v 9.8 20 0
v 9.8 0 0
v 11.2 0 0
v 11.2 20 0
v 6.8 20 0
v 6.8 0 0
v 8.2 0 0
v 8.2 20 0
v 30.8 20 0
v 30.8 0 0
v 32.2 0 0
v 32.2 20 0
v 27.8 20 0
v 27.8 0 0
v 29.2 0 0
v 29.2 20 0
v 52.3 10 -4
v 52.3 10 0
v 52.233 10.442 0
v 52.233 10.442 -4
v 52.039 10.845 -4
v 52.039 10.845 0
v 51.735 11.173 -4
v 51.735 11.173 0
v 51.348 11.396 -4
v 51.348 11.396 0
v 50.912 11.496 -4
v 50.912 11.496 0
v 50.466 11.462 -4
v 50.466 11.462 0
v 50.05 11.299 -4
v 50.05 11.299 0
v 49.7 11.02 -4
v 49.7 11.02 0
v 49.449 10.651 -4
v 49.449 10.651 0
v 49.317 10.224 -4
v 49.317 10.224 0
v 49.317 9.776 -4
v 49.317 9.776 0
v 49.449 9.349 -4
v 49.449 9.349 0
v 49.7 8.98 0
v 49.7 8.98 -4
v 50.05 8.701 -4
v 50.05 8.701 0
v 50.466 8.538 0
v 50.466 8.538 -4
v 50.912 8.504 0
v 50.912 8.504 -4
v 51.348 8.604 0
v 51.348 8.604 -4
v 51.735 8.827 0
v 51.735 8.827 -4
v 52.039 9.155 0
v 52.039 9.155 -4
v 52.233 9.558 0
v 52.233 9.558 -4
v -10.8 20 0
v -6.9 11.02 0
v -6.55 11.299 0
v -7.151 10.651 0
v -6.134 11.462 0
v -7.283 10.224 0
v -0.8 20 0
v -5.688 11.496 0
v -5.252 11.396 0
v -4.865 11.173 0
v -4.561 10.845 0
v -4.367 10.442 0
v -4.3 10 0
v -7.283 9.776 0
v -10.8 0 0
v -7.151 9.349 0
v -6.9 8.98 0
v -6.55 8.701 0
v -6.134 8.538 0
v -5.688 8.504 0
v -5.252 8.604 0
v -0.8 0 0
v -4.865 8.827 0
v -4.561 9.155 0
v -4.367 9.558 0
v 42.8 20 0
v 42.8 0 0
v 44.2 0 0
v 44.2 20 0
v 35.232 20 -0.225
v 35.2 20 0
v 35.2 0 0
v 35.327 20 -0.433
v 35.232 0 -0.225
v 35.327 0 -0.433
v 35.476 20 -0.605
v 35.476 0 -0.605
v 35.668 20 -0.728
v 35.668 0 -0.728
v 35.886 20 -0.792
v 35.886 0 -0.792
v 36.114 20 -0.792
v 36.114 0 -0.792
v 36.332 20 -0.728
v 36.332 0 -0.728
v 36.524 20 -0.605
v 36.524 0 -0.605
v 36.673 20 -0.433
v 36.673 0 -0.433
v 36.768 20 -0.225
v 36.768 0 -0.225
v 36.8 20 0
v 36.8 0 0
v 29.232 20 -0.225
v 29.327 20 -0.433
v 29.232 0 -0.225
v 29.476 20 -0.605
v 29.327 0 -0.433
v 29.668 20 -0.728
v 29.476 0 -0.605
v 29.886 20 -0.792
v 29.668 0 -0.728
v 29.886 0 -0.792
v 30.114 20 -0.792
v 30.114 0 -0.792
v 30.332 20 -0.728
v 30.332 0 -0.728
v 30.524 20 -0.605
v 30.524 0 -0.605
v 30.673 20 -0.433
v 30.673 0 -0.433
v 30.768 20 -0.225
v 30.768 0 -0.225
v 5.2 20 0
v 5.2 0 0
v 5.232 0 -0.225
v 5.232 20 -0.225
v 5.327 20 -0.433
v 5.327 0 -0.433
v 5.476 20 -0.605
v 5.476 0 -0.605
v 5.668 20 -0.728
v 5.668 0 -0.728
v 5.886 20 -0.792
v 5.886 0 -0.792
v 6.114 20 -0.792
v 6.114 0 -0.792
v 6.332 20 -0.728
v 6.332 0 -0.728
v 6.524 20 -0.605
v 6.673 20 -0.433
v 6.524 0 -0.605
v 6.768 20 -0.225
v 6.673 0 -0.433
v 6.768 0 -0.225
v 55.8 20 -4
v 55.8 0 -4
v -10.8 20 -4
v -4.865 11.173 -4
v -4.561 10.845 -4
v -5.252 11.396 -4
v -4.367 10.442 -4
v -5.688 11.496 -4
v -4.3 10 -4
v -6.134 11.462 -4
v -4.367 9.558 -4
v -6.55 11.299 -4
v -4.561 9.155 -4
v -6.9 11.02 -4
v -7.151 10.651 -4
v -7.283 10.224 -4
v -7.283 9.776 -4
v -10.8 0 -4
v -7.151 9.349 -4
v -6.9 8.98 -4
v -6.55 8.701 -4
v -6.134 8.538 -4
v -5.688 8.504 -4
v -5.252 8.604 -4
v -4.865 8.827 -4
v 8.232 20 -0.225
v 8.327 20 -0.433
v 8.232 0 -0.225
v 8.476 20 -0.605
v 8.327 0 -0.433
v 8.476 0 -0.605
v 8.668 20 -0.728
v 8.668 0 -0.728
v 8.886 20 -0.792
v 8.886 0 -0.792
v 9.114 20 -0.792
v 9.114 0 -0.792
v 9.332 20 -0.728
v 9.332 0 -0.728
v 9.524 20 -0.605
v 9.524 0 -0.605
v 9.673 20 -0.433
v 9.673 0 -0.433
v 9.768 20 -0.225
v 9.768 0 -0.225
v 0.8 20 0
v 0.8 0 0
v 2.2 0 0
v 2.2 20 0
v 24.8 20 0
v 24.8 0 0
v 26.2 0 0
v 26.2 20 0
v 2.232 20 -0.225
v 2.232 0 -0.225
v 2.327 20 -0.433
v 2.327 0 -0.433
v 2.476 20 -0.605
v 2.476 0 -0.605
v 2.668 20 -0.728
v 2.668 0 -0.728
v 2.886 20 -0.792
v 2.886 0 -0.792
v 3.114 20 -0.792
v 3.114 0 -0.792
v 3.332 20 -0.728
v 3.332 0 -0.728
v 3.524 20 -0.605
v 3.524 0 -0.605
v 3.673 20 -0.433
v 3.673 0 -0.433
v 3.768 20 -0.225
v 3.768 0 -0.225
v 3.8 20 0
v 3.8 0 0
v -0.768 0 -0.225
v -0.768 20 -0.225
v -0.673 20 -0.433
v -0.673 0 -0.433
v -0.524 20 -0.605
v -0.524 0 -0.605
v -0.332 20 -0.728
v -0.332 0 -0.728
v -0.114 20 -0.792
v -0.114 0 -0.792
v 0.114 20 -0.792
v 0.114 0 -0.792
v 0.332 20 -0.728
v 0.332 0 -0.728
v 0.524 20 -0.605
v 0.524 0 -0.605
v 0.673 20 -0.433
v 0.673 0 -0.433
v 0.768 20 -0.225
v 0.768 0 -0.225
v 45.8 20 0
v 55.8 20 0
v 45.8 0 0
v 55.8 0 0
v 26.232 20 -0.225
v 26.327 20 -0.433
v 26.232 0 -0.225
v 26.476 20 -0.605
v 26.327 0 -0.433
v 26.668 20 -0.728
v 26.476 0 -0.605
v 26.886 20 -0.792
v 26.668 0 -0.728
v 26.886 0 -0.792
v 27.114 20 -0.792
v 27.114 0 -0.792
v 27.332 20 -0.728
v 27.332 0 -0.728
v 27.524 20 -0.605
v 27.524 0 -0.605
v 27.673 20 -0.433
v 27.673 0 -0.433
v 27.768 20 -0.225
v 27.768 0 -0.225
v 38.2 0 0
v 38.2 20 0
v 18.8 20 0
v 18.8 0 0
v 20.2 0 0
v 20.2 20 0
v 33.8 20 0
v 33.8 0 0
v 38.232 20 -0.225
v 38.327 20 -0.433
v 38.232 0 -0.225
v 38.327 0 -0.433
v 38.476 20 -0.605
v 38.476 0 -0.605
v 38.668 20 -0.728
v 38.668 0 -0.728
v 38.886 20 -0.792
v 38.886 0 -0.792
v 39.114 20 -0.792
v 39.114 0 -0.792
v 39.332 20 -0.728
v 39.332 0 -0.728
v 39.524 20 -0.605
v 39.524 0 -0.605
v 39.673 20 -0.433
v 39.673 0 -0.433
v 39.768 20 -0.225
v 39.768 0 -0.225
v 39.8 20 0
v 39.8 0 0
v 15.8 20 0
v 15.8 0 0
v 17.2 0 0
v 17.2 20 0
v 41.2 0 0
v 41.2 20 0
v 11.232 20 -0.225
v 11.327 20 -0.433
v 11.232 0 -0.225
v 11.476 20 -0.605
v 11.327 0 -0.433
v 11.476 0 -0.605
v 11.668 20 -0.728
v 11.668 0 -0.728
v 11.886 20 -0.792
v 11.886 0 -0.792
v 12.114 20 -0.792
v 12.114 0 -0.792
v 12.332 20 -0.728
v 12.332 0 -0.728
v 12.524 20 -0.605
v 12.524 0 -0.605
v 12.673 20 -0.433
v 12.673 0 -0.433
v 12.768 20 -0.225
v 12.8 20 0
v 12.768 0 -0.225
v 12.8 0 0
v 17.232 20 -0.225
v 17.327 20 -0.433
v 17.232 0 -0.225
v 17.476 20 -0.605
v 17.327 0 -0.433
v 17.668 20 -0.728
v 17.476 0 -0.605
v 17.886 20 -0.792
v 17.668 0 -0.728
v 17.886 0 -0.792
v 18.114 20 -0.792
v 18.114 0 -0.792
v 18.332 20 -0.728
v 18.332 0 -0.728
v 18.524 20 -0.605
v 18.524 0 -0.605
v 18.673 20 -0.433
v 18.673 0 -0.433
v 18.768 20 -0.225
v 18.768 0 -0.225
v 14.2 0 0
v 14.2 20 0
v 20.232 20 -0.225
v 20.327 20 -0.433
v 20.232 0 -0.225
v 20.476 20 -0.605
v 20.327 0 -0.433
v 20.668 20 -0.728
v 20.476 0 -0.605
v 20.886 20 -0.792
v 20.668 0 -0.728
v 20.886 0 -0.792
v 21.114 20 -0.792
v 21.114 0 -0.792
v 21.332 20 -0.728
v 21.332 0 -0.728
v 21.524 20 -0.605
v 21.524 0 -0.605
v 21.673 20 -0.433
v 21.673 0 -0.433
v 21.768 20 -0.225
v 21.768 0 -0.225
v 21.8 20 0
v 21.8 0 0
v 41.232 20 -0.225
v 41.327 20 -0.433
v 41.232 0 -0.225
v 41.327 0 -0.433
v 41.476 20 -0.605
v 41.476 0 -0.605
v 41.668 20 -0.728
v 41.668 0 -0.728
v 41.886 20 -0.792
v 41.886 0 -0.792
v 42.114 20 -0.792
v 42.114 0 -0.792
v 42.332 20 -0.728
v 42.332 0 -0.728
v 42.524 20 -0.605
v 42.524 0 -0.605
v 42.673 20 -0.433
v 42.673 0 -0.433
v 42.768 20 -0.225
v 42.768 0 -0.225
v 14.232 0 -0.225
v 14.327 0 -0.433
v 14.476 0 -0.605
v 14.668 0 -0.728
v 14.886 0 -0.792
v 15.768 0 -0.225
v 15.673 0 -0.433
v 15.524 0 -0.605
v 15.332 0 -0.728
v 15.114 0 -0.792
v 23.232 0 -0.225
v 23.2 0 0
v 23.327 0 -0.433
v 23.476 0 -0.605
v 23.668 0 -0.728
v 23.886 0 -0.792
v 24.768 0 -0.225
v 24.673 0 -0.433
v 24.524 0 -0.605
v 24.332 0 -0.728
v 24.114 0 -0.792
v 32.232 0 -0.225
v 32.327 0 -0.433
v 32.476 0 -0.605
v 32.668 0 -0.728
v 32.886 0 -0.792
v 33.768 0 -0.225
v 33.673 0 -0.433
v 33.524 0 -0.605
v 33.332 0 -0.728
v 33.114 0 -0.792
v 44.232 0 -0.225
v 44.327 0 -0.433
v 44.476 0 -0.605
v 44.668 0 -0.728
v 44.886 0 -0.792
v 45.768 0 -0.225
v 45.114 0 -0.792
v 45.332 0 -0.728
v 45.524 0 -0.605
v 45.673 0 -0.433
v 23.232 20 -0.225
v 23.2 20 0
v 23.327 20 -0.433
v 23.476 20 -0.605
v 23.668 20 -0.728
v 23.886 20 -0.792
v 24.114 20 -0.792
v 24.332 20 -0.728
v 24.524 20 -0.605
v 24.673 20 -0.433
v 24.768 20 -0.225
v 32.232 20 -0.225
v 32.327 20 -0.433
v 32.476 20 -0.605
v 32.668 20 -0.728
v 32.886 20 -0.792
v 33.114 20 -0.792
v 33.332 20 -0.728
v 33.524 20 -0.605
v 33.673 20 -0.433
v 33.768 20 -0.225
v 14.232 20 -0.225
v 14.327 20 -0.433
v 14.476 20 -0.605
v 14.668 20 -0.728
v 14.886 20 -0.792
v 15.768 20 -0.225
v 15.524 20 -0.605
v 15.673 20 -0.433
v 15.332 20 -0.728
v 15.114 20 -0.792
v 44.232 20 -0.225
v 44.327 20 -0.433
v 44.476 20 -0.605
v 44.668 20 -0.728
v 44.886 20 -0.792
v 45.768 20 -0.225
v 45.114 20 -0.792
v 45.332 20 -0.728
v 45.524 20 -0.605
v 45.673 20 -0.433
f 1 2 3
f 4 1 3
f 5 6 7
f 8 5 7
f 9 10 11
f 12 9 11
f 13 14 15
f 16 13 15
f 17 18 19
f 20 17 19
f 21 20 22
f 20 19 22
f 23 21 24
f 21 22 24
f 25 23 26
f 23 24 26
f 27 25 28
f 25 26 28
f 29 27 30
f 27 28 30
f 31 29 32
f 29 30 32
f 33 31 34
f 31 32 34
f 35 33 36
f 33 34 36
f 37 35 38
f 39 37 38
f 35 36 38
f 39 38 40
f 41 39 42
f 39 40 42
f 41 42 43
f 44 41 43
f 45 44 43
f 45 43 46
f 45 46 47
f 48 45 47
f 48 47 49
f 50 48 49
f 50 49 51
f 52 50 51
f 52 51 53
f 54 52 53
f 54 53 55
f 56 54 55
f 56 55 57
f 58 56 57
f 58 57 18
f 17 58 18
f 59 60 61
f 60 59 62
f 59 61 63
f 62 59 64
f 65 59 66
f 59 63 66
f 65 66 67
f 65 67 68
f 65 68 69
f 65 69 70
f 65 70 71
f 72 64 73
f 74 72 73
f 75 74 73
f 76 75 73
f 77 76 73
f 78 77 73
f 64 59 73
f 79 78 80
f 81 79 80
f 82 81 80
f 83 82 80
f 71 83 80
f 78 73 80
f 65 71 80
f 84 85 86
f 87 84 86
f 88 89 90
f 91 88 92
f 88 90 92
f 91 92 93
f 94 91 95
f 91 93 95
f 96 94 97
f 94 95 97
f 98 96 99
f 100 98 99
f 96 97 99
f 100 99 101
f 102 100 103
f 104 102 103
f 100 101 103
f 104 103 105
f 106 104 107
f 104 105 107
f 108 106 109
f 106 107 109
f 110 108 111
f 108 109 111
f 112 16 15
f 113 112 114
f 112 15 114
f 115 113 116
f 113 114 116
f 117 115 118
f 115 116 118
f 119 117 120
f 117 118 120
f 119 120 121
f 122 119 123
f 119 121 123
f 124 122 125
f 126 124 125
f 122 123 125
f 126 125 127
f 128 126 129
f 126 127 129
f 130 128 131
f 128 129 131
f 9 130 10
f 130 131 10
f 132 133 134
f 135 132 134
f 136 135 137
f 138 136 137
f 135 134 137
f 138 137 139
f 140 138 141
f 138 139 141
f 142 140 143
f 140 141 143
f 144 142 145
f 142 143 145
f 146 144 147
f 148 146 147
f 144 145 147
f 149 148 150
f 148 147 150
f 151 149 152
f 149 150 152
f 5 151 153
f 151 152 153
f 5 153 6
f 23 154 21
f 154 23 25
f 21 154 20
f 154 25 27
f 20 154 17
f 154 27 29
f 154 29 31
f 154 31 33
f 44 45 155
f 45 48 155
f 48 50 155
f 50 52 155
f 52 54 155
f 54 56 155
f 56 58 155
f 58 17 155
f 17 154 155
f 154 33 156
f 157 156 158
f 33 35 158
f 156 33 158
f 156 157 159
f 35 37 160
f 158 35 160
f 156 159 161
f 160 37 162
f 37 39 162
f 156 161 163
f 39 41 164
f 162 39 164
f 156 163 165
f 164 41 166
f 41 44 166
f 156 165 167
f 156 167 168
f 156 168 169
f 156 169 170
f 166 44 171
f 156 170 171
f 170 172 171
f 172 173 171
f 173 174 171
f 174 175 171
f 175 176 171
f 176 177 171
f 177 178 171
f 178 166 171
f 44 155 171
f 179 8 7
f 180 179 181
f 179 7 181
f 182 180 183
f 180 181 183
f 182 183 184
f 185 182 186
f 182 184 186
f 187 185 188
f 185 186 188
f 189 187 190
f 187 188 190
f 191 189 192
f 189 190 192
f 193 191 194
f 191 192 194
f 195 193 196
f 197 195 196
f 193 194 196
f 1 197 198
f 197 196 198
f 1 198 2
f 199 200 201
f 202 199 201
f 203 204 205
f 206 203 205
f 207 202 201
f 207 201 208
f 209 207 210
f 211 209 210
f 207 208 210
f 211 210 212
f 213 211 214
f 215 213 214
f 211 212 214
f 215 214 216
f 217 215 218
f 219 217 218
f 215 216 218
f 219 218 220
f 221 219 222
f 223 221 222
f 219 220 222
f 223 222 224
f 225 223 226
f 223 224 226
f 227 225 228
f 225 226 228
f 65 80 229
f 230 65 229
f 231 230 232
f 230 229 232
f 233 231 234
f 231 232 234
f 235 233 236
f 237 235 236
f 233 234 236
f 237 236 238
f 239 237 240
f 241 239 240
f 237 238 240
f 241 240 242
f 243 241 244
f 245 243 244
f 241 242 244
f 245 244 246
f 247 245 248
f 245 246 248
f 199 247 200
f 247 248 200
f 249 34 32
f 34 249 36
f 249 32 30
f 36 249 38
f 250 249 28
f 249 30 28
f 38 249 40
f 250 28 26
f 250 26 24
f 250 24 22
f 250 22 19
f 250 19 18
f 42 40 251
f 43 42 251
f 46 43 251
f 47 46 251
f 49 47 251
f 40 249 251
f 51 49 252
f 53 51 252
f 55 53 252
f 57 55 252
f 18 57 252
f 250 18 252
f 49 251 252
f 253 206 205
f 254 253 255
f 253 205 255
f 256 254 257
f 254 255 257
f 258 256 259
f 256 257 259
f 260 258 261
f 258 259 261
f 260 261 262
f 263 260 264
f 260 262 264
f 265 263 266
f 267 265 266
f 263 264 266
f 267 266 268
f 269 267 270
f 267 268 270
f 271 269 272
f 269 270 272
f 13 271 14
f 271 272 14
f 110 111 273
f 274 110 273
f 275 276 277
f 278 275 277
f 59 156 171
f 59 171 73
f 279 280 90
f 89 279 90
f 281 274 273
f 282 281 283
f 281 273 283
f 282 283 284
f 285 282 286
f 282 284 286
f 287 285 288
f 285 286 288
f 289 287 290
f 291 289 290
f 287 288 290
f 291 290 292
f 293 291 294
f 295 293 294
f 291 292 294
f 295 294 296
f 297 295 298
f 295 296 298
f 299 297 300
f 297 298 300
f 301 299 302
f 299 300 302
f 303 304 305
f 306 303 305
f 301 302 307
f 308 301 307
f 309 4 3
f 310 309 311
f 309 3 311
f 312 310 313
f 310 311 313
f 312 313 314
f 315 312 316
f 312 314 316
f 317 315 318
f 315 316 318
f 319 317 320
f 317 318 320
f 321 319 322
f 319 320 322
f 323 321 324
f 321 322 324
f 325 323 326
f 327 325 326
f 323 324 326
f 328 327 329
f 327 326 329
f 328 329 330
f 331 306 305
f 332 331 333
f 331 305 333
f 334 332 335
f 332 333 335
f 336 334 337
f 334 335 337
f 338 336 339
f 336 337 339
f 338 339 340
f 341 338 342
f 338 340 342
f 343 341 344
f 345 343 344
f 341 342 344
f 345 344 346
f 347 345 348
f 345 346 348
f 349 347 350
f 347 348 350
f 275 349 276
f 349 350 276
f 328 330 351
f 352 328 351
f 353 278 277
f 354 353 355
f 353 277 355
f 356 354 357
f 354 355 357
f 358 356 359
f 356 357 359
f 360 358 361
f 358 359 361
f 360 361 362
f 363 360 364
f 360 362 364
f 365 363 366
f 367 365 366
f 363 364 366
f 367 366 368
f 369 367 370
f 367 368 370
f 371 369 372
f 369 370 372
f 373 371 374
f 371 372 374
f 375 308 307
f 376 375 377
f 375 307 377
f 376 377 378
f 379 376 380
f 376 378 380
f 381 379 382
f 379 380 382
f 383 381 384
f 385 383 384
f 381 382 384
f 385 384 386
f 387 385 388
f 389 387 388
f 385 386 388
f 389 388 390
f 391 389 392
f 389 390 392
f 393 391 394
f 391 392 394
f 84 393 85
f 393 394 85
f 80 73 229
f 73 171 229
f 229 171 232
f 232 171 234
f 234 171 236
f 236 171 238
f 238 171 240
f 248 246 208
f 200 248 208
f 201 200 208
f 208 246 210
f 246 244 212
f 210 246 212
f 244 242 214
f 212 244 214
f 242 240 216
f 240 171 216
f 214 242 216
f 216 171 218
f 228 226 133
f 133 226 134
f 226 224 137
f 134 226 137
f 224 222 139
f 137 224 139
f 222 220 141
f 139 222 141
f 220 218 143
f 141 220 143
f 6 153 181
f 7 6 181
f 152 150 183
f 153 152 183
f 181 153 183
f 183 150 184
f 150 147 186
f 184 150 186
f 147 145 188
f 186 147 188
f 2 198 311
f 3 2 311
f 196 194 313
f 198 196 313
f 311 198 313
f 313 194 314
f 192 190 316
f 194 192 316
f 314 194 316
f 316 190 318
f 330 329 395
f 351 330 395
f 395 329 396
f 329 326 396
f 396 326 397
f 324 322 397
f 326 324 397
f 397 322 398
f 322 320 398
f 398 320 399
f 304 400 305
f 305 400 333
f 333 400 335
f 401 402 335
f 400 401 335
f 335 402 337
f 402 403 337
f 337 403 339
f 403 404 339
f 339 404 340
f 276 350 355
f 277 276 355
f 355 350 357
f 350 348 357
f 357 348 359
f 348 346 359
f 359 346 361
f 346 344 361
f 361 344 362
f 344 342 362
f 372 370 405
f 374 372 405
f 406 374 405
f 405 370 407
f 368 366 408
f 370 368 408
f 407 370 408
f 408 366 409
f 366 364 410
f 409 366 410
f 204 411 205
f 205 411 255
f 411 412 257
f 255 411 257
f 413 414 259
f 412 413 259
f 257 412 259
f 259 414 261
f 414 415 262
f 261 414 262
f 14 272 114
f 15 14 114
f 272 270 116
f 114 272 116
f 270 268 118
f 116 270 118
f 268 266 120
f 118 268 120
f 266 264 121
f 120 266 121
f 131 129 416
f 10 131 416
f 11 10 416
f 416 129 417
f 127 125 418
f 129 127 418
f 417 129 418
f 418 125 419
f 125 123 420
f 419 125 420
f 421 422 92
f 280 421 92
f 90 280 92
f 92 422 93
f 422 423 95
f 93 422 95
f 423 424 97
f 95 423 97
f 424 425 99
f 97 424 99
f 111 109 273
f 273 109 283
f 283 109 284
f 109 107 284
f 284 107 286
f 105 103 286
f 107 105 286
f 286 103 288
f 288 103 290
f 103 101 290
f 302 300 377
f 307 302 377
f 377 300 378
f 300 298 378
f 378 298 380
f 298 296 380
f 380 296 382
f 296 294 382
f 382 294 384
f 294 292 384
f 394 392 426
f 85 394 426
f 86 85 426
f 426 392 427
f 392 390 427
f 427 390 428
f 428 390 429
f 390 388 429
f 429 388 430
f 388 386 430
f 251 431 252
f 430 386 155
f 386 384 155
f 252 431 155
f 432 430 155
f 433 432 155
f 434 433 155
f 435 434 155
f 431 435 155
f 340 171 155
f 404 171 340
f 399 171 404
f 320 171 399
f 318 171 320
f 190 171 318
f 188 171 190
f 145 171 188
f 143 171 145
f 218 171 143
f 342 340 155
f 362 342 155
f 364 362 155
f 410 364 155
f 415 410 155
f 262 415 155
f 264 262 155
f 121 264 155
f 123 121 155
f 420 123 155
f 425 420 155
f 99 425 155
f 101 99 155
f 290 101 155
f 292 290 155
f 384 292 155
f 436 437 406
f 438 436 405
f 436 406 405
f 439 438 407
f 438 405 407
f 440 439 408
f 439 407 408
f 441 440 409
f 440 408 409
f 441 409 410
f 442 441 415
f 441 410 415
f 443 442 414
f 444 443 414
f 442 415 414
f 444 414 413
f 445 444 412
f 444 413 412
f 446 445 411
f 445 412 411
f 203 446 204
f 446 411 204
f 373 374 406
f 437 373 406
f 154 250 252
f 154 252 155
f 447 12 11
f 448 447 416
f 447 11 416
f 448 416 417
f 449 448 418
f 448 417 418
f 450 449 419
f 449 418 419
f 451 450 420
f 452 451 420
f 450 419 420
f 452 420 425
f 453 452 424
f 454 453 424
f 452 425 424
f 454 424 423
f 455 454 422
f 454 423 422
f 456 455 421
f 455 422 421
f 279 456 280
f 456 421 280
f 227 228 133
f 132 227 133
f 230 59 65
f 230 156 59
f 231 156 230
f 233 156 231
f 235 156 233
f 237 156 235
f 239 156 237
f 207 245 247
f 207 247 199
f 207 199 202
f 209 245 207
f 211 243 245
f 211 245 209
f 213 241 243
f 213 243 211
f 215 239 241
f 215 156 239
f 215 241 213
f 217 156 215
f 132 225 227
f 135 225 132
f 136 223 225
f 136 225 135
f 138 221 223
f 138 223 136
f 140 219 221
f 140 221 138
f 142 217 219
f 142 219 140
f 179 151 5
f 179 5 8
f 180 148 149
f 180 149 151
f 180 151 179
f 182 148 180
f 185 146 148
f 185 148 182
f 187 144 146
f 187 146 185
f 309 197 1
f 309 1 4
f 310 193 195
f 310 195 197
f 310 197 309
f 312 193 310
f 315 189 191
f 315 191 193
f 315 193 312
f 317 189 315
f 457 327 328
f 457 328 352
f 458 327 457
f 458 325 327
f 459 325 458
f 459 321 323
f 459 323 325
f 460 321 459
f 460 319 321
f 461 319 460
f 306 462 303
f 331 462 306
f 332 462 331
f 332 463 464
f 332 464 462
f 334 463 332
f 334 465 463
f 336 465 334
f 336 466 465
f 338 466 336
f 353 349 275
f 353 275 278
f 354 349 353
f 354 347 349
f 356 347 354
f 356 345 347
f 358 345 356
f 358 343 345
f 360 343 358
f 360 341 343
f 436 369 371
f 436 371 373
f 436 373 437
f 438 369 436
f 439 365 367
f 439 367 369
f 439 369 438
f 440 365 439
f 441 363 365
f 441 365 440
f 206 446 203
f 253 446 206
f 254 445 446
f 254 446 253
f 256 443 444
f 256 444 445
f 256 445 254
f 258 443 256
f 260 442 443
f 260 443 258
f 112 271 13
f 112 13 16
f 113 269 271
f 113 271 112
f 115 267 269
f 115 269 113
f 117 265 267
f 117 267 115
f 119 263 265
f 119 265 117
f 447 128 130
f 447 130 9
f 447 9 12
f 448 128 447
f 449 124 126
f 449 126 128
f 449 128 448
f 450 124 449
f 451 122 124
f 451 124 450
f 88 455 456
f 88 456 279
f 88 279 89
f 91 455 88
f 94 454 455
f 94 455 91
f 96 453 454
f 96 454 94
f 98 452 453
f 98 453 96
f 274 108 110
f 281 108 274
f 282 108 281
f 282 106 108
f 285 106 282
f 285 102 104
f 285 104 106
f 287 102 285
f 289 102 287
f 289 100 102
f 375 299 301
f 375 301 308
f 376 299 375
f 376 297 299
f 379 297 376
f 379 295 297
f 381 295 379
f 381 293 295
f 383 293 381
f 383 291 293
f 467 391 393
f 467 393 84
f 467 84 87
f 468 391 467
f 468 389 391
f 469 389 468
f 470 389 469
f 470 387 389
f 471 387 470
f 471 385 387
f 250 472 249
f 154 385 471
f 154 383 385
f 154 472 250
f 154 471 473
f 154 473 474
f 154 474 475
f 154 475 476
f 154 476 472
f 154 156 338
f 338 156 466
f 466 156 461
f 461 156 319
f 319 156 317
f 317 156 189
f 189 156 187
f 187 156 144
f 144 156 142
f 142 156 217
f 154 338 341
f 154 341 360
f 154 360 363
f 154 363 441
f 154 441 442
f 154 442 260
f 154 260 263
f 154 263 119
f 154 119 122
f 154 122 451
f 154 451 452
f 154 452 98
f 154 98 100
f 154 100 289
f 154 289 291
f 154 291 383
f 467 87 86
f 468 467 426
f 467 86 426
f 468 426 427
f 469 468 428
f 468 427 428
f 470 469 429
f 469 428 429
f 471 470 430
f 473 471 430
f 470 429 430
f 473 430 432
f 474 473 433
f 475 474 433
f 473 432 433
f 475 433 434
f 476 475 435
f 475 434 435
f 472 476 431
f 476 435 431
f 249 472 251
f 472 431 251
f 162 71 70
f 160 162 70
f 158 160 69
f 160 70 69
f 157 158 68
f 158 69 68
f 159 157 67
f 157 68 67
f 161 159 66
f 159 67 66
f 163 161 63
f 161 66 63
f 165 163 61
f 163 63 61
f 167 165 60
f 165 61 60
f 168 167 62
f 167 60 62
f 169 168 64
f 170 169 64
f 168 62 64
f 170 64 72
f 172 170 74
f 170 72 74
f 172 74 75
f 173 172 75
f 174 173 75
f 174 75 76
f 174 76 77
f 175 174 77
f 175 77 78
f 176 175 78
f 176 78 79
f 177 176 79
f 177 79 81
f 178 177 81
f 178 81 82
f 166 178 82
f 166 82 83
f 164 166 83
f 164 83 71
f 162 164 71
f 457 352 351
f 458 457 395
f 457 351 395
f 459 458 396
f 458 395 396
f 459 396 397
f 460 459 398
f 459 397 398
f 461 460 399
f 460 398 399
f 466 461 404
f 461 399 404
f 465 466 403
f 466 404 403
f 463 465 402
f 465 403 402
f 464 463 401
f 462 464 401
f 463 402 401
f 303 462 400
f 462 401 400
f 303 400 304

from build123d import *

# Parameters (mm, degrees)
EXTRUDE_1_DEPTH     = 20
SKETCH_2_R          = 1.5
CUT_EXTRUDE_1_DEPTH = 10


with BuildPart() as part:
    # 草图1 → 凸台-拉伸1 (new body)
    with BuildSketch(Plane(origin=(0, 0, 0), x_dir=(1, 0, 0), z_dir=(0, 1, 0))):
        with BuildLine():
            Line((-10.8, 0), (-0.8, 0))
            ThreePointArc((-0.8, 0), (0, 0.8), (0.8, 0))
            Line((0.8, 0), (2.2, 0))
            ThreePointArc((2.2, 0), (3, 0.8), (3.8, 0))
            Line((3.8, 0), (5.2, 0))
            ThreePointArc((5.2, 0), (6, 0.8), (6.8, 0))
            Line((6.8, 0), (8.2, 0))
            ThreePointArc((8.2, 0), (9, 0.8), (9.8, 0))
            Line((9.8, 0), (11.2, 0))
            ThreePointArc((11.2, 0), (12, 0.8), (12.8, 0))
            Line((12.8, 0), (14.2, 0))
            ThreePointArc((14.2, 0), (15, 0.8), (15.8, 0))
            Line((15.8, 0), (17.2, 0))
            ThreePointArc((17.2, 0), (18, 0.8), (18.8, 0))
            Line((18.8, 0), (20.2, 0))
            ThreePointArc((20.2, 0), (21, 0.8), (21.8, 0))
            Line((21.8, 0), (23.2, 0))
            ThreePointArc((23.2, 0), (24, 0.8), (24.8, 0))
            Line((24.8, 0), (26.2, 0))
            ThreePointArc((26.2, 0), (27, 0.8), (27.8, 0))
            Line((27.8, 0), (29.2, 0))
            ThreePointArc((29.2, 0), (30, 0.8), (30.8, 0))
            Line((30.8, 0), (32.2, 0))
            ThreePointArc((32.2, 0), (33, 0.8), (33.8, 0))
            Line((33.8, 0), (35.2, 0))
            ThreePointArc((35.2, 0), (36, 0.8), (36.8, 0))
            Line((36.8, 0), (38.2, 0))
            ThreePointArc((38.2, 0), (39, 0.8), (39.8, 0))
            Line((39.8, 0), (41.2, 0))
            ThreePointArc((41.2, 0), (42, 0.8), (42.8, 0))
            Line((42.8, 0), (44.2, 0))
            ThreePointArc((44.2, 0), (45, 0.8), (45.8, 0))
            Line((45.8, 0), (55.8, 0))
            Line((55.8, 0), (55.8, 4))
            Line((55.8, 4), (-10.8, 4))
            Line((-10.8, 4), (-10.8, 0))
        make_face()
    extrude(amount=EXTRUDE_1_DEPTH)

    # 草图2 → 切除-拉伸1 (cut)
    with BuildSketch(Plane.XY):
        with Locations((-5.8, 10)):
            Circle(SKETCH_2_R)
        with Locations((50.8, 10)):
            Circle(SKETCH_2_R)
    extrude(amount=-CUT_EXTRUDE_1_DEPTH, mode=Mode.SUBTRACT)


solid = part.part
